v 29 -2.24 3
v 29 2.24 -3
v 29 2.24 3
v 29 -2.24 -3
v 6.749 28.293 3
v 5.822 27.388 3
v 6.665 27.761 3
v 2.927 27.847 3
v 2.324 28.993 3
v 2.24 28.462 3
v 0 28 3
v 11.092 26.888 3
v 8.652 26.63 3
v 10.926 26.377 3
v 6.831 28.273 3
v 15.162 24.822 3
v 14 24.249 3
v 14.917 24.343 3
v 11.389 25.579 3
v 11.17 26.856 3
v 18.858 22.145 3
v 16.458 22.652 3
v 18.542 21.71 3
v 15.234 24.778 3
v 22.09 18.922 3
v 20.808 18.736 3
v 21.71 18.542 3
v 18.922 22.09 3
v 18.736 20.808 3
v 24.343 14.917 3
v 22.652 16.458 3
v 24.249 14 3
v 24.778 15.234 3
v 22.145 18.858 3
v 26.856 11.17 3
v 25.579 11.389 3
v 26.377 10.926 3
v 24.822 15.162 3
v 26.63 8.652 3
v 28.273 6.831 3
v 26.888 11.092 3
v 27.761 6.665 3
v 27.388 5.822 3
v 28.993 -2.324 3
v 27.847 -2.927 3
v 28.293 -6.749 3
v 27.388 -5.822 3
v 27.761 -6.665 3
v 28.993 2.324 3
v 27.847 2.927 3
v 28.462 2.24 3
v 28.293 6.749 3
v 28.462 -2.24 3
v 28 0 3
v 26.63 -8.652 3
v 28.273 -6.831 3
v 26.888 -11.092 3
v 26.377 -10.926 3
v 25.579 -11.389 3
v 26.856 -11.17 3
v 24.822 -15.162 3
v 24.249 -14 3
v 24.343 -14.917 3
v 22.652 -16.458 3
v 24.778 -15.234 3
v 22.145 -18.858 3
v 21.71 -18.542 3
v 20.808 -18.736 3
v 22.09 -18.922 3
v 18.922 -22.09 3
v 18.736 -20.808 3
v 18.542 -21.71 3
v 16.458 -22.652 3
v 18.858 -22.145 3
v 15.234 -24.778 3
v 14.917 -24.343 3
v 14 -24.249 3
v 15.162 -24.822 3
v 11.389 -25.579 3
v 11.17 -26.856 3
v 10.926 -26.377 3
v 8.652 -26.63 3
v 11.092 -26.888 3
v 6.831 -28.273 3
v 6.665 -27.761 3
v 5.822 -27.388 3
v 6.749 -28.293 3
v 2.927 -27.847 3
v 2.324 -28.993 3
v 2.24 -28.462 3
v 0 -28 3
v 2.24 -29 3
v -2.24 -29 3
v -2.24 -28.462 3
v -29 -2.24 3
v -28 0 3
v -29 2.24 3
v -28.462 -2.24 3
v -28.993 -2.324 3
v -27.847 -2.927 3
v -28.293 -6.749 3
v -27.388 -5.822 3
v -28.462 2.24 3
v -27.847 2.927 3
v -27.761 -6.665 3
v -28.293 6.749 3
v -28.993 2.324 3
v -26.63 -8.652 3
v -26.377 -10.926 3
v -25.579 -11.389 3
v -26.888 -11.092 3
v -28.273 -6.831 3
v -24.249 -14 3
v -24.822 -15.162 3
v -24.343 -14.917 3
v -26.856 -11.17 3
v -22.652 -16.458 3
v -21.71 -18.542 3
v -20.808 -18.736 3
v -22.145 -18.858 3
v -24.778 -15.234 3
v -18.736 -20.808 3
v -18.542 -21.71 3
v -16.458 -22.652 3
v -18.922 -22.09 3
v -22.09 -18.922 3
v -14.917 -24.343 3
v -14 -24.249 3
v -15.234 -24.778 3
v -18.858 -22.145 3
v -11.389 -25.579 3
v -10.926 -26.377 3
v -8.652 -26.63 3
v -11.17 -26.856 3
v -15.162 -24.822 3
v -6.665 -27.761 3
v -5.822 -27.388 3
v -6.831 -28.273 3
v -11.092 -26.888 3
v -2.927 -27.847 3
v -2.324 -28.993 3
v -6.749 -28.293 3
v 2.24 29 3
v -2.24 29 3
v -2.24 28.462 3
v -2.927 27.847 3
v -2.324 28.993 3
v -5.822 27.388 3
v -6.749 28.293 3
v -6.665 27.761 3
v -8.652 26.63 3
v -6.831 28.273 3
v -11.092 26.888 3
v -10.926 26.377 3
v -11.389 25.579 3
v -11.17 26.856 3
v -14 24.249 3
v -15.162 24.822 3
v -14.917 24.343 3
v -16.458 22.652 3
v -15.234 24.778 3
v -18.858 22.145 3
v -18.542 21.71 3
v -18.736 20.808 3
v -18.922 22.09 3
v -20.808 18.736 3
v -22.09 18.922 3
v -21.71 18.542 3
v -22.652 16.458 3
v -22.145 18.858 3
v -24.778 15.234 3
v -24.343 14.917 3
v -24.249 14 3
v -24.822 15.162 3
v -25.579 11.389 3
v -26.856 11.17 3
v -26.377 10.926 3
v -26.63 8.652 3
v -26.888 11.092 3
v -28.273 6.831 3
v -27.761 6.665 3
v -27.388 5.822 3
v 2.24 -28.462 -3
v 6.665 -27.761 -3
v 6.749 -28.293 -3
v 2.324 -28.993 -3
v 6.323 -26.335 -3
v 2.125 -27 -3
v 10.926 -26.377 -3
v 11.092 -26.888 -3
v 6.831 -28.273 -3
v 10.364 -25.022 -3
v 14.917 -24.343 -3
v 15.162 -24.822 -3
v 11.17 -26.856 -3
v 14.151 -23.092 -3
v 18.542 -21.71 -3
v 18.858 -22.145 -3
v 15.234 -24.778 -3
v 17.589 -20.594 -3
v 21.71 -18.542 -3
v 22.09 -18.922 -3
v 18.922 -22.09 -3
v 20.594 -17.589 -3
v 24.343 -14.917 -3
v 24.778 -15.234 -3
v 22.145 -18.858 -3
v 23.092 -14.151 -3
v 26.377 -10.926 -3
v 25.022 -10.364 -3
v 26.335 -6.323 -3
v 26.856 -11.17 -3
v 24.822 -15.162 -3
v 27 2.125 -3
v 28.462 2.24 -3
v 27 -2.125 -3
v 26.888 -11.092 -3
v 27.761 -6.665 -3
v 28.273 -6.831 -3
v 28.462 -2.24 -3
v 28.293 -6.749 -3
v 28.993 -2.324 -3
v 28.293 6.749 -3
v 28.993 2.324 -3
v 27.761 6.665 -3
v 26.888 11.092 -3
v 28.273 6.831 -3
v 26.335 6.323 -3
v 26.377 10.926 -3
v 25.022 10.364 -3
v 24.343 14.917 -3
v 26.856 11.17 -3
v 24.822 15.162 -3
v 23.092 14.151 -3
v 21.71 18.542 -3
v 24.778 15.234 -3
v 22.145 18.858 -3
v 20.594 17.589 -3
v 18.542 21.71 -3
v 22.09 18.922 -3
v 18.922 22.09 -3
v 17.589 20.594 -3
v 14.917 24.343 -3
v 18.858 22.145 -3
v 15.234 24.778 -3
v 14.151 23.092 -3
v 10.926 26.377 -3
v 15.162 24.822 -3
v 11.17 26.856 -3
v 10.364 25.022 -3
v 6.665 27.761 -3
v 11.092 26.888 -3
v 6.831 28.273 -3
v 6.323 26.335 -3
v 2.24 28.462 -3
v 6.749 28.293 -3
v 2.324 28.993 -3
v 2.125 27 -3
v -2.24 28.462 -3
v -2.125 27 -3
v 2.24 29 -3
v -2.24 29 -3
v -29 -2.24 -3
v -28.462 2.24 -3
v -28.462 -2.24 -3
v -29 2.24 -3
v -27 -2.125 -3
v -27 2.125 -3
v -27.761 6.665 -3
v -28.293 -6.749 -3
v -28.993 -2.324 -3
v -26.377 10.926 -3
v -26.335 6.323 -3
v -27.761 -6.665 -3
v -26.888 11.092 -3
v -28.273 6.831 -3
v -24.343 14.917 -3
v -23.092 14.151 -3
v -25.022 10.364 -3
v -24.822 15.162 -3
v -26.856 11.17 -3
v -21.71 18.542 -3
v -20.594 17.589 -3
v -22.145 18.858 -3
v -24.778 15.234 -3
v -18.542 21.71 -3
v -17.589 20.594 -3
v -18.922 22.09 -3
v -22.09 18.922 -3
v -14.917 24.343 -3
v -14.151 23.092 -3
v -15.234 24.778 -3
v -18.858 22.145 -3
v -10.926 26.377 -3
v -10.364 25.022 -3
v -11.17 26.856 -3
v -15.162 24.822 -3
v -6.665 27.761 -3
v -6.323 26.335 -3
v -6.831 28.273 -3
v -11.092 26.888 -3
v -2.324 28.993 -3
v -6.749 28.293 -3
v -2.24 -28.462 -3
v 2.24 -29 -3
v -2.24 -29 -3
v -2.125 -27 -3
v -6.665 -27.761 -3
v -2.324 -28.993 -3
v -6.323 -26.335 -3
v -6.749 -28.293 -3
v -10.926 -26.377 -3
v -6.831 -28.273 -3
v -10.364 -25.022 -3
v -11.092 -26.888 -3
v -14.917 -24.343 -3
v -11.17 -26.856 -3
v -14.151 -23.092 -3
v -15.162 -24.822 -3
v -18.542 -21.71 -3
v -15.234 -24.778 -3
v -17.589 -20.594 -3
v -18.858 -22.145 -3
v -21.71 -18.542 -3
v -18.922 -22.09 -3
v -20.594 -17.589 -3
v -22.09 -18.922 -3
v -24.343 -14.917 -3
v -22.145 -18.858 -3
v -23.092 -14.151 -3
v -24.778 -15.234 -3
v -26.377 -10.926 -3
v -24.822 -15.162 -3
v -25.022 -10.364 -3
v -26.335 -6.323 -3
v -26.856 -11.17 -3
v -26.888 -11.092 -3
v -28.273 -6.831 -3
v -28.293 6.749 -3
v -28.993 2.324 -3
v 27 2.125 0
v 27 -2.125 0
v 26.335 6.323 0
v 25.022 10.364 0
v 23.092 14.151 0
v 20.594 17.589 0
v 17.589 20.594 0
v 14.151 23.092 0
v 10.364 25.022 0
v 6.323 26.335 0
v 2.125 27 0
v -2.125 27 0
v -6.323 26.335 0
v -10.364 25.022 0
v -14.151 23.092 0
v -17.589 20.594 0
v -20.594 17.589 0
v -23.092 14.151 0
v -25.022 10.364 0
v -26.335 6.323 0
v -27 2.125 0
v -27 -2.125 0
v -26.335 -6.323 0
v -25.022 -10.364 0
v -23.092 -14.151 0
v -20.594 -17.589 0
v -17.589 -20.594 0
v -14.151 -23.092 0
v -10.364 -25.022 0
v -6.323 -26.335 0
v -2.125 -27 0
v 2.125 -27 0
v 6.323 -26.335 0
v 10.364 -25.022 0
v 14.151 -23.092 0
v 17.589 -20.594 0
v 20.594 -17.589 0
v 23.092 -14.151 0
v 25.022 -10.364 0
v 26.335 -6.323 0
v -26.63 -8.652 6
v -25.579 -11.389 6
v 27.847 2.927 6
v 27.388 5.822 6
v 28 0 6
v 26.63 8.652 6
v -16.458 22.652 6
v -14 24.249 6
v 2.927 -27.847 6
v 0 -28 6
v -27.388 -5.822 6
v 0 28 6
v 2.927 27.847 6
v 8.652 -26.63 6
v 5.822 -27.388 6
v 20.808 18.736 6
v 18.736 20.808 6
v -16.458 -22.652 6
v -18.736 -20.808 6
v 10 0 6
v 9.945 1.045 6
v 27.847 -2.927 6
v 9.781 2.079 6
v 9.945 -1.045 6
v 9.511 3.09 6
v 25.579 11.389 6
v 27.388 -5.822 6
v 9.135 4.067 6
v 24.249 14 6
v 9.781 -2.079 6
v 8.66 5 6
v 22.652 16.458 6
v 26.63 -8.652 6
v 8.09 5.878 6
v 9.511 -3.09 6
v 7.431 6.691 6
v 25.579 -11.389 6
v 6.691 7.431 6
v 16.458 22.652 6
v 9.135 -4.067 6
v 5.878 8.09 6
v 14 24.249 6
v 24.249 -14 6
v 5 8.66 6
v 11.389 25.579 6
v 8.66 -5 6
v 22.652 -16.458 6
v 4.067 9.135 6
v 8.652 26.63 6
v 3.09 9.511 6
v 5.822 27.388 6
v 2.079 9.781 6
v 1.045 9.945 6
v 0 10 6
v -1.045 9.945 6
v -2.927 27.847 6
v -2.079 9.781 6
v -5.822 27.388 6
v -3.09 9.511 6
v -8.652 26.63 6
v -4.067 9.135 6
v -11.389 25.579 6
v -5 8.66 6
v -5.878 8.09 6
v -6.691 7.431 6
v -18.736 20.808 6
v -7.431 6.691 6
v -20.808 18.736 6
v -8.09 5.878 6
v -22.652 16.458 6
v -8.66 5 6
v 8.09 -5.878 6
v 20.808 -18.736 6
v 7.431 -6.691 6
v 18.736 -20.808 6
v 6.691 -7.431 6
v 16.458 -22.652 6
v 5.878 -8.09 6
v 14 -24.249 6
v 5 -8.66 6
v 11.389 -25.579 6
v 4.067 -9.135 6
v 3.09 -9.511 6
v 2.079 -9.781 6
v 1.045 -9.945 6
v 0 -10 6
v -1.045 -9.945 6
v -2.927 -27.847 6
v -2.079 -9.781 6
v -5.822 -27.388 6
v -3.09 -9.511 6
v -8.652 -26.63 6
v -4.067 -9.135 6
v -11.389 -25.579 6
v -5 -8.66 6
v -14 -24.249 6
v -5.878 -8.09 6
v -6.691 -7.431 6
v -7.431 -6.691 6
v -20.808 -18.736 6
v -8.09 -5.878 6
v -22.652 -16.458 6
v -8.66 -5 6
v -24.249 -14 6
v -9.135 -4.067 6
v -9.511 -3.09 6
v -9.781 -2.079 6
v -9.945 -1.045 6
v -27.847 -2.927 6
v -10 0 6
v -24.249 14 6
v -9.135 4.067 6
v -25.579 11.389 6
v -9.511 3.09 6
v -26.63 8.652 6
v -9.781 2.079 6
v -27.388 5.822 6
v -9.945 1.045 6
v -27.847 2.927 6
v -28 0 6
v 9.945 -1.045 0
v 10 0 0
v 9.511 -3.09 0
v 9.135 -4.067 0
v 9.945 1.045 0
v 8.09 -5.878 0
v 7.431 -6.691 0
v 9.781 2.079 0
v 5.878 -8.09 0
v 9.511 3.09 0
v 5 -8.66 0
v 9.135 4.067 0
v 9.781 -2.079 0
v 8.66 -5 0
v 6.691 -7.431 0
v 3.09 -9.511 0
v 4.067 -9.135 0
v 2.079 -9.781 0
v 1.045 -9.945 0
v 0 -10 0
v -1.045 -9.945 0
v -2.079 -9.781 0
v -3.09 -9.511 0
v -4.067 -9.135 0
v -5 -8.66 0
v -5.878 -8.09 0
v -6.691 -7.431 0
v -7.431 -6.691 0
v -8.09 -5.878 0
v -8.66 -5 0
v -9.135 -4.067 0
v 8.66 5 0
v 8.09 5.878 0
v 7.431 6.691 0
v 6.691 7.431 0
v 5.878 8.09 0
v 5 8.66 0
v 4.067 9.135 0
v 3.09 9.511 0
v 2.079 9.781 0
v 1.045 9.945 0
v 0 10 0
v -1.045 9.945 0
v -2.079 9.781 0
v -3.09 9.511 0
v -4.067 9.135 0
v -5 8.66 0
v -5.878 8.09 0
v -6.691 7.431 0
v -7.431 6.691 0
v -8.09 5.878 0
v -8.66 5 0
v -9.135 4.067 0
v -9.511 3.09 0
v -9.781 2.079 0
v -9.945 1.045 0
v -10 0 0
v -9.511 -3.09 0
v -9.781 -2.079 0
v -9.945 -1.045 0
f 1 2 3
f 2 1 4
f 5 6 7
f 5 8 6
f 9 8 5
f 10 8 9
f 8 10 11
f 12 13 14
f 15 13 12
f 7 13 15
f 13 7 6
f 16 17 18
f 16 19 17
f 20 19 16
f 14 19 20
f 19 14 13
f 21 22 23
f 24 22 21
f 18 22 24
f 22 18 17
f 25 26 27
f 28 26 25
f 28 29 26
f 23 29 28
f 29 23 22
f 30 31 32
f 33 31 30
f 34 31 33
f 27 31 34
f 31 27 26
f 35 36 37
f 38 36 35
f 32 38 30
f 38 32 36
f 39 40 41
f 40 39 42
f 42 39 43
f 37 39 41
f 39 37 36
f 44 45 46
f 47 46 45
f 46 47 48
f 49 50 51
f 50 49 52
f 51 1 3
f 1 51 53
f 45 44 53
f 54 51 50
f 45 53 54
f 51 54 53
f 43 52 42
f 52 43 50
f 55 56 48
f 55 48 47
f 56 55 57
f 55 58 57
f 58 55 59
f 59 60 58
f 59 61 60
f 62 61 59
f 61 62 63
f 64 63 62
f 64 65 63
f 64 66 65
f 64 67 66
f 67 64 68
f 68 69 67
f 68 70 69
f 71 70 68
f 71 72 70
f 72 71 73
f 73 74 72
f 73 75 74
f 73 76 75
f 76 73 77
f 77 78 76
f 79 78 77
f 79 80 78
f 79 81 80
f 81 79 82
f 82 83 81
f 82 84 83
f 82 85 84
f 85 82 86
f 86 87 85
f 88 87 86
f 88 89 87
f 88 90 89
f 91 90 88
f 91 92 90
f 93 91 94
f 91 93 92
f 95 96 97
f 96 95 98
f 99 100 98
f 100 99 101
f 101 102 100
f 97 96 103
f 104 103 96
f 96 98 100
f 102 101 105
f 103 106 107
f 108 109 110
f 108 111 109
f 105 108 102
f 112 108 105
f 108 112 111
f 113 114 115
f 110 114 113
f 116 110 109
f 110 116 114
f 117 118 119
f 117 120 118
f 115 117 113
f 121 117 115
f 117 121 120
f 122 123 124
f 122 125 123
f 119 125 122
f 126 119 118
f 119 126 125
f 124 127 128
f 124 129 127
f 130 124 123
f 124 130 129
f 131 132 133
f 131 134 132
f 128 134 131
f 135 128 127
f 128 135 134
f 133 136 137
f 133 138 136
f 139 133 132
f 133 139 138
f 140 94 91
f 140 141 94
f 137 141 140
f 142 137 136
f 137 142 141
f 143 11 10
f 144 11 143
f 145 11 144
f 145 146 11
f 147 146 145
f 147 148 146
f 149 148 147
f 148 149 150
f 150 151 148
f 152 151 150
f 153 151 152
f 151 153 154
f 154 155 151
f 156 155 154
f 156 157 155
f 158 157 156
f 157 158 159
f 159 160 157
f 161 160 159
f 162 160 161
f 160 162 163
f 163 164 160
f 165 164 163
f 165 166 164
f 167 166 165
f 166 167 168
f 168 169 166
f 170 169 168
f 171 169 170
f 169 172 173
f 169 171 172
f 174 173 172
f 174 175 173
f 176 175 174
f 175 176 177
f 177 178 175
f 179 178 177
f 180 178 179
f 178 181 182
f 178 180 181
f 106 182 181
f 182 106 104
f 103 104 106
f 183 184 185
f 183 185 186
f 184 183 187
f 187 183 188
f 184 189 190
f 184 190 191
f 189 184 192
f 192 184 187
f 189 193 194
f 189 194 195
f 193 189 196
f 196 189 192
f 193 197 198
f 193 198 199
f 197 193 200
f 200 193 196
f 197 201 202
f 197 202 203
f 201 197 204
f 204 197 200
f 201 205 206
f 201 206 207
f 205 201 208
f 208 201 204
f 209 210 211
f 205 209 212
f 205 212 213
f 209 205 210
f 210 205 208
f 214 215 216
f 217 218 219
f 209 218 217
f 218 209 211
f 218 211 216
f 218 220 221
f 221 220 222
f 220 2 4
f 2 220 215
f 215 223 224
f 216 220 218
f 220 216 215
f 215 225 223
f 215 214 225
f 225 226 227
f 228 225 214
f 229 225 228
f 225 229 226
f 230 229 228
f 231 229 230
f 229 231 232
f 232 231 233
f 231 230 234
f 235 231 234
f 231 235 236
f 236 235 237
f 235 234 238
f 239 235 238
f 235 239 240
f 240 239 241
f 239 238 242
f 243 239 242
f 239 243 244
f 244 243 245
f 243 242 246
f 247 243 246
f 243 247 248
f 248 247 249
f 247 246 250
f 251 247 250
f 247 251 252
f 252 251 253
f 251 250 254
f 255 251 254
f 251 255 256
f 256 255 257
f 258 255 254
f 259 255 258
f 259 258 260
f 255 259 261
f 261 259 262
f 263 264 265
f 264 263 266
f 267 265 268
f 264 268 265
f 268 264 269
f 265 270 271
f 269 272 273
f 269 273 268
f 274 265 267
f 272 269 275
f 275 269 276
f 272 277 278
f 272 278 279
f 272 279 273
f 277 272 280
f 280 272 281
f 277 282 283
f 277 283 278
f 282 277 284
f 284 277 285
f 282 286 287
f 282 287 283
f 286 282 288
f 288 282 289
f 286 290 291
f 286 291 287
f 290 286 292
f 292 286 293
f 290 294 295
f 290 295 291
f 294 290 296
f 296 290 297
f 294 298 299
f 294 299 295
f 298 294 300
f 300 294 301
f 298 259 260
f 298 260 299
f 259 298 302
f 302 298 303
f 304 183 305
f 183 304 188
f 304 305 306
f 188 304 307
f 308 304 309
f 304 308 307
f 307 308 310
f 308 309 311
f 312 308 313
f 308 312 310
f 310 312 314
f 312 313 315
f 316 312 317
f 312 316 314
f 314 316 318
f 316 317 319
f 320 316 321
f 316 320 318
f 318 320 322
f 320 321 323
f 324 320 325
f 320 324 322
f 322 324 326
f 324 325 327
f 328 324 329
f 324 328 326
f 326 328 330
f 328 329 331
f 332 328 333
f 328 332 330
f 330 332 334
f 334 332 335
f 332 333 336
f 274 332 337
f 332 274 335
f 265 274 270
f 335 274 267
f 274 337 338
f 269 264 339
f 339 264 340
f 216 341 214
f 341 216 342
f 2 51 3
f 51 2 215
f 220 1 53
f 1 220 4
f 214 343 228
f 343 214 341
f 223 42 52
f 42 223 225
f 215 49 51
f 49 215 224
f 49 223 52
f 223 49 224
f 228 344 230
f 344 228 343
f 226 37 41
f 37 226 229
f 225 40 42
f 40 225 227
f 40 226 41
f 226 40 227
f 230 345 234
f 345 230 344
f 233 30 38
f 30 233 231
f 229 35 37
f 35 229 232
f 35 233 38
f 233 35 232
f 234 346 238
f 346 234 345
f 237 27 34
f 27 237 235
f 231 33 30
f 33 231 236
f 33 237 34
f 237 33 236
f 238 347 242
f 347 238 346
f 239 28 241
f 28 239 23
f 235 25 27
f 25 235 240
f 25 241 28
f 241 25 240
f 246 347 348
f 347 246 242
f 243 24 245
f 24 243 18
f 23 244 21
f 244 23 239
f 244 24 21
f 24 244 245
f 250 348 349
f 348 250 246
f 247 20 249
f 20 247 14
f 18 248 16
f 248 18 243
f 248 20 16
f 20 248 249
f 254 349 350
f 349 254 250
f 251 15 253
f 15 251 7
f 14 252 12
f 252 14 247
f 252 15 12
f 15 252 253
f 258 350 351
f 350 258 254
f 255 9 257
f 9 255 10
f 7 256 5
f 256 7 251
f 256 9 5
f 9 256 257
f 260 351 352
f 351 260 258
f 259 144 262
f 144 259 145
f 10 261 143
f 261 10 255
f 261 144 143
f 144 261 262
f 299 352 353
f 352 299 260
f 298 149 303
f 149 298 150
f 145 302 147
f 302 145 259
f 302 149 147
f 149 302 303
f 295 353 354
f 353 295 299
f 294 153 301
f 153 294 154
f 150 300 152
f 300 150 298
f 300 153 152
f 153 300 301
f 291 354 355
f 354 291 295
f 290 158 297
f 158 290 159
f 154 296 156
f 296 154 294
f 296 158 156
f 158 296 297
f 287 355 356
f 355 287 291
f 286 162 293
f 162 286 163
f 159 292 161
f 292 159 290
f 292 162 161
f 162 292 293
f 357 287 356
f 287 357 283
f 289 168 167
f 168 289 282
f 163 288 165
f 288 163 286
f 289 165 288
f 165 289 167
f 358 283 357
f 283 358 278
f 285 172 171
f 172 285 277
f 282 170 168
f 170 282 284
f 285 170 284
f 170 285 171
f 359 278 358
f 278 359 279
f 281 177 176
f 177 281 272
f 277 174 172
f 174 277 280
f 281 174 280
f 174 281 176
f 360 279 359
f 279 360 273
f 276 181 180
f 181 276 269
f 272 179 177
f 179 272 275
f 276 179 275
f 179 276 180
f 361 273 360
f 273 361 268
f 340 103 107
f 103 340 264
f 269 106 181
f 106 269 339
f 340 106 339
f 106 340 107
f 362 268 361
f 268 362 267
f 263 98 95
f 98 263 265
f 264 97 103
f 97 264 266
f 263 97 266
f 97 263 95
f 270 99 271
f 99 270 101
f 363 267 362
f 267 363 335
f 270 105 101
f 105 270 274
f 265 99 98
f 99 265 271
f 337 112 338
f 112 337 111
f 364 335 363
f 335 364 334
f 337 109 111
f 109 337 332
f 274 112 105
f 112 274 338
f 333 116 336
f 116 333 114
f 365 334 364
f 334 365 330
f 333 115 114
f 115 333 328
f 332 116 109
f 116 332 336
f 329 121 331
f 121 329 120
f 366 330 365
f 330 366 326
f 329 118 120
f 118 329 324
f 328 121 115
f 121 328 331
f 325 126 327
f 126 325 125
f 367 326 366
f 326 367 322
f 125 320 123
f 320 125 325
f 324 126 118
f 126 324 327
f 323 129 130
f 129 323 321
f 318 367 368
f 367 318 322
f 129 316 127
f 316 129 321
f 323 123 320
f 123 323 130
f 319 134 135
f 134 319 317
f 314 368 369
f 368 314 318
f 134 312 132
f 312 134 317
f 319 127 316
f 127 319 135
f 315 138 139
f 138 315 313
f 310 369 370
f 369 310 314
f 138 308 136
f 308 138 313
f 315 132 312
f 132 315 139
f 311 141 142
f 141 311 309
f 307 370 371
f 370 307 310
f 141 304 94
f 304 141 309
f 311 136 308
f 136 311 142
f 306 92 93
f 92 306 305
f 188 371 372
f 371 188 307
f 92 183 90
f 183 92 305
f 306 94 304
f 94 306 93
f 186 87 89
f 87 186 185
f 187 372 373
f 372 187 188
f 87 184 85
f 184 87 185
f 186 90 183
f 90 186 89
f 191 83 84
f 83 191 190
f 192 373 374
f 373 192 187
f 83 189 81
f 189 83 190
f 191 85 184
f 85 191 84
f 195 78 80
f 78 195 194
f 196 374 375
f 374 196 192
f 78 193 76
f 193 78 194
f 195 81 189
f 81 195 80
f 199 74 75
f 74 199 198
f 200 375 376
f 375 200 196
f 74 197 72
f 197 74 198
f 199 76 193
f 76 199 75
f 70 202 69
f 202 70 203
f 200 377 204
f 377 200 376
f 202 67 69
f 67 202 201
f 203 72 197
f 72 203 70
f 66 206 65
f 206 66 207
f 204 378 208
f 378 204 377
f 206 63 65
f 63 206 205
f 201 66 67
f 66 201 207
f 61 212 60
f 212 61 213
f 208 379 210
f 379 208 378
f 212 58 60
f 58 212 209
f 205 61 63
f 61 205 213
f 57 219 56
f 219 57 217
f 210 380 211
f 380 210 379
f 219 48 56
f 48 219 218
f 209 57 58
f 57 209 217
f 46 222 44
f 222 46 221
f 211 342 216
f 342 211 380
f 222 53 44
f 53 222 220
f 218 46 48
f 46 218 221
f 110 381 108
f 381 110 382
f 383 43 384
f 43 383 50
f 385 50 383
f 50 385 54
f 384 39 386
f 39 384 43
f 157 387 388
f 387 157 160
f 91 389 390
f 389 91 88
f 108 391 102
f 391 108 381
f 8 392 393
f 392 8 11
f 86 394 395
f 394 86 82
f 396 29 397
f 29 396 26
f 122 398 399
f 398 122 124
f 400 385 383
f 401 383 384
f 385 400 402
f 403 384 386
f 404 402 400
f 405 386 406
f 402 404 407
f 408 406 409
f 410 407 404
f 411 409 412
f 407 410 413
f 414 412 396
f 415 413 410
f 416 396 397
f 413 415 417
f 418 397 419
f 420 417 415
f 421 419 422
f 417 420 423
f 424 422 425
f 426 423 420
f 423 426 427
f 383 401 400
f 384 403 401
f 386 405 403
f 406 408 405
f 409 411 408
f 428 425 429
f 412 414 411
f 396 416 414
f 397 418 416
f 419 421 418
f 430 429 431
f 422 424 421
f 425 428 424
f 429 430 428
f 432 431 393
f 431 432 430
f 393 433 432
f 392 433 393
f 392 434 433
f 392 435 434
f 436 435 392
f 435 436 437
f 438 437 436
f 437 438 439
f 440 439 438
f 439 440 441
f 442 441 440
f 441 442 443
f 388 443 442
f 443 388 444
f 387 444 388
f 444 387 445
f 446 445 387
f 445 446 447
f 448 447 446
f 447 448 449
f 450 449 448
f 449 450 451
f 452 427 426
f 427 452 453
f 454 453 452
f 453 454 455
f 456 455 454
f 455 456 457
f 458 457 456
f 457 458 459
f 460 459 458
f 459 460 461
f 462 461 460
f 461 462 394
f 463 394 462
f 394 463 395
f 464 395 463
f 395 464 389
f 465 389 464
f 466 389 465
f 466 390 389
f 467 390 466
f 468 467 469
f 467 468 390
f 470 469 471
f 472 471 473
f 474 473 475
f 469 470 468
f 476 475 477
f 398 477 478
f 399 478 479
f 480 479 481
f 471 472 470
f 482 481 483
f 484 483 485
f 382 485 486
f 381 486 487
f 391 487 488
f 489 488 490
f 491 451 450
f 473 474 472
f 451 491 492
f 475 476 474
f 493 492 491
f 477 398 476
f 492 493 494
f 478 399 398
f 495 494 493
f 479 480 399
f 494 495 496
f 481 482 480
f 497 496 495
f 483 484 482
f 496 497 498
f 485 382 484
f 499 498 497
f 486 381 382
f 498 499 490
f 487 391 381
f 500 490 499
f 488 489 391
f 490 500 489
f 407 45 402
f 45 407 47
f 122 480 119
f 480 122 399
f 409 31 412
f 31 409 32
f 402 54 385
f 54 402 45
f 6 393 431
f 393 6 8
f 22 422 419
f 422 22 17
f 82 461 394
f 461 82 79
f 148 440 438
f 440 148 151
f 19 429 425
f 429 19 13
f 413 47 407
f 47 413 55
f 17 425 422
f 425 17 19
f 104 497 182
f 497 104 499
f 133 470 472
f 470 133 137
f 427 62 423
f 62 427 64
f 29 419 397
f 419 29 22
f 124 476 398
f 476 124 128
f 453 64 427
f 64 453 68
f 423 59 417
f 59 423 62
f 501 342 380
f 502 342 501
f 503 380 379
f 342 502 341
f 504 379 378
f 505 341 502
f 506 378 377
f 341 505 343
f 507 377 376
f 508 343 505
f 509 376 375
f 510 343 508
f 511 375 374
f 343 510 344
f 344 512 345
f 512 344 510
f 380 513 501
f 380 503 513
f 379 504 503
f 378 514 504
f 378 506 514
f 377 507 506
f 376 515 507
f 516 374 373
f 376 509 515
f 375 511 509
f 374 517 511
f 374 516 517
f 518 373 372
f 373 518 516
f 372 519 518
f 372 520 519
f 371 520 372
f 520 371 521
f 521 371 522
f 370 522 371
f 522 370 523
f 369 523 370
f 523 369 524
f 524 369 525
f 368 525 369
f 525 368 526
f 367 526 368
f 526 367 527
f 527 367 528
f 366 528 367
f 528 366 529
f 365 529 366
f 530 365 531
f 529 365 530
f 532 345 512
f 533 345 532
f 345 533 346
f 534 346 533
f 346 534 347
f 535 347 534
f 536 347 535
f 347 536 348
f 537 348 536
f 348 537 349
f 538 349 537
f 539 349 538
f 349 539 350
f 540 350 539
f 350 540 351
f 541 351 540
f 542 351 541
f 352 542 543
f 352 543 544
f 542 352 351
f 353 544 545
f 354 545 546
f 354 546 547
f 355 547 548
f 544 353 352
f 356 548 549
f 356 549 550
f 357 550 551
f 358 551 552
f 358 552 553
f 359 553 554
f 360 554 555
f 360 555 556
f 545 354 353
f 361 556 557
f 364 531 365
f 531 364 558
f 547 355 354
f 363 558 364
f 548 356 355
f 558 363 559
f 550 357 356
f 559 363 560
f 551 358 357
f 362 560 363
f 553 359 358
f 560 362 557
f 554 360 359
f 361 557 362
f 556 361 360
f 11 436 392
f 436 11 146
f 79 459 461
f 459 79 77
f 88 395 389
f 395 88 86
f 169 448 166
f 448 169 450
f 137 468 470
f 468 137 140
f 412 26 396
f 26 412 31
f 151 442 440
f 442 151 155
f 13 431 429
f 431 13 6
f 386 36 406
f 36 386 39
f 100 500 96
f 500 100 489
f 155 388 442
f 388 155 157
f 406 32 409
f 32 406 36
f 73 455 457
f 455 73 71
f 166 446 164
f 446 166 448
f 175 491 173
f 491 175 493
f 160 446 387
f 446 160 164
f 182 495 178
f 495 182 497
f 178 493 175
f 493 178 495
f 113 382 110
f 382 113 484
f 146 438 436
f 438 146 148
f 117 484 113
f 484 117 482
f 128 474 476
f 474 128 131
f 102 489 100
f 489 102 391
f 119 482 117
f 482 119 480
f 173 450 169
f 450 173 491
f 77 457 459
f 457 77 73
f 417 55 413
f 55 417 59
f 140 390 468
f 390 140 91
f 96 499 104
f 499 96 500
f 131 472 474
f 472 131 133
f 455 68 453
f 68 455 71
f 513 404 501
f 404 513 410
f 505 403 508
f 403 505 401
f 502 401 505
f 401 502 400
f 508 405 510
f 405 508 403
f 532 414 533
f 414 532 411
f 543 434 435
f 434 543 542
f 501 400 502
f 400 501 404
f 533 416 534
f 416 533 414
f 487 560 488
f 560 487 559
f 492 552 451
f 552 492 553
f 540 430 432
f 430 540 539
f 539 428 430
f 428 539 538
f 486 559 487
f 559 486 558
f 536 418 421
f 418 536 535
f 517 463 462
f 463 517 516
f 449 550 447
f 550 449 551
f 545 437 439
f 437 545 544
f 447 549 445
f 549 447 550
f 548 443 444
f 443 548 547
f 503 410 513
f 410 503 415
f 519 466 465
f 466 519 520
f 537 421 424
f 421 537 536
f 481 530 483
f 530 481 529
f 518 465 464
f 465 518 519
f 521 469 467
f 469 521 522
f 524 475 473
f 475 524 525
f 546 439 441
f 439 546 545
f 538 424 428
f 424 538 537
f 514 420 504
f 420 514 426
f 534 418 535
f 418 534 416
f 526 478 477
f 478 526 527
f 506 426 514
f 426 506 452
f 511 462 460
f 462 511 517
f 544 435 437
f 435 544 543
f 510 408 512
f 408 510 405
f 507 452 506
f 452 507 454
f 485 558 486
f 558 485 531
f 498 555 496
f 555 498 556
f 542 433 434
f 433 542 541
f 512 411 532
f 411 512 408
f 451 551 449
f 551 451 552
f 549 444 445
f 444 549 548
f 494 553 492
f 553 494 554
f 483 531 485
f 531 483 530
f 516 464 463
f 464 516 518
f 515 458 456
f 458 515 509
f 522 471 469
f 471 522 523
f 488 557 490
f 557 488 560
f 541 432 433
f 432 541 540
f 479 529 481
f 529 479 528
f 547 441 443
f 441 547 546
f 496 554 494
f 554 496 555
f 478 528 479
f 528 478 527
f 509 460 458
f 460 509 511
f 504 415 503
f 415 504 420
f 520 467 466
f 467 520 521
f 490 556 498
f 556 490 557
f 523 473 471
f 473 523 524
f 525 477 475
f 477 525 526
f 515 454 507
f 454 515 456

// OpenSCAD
// Gear blank with external locator teeth.
$fn = 60;
eps = 0.02;
bore_d = 20;
root_d = 56;
teeth = 40;
thickness = 6;
difference() { union() { cylinder(d=root_d,h=thickness); for(i=[0:teeth-1]) rotate([0,0,i*360/teeth]) translate([root_d/2,0,0]) cube([2,max(2,root_d*0.08),thickness],center=true); } translate([0,0,-eps]) cylinder(d=bore_d,h=thickness+2*eps); }
